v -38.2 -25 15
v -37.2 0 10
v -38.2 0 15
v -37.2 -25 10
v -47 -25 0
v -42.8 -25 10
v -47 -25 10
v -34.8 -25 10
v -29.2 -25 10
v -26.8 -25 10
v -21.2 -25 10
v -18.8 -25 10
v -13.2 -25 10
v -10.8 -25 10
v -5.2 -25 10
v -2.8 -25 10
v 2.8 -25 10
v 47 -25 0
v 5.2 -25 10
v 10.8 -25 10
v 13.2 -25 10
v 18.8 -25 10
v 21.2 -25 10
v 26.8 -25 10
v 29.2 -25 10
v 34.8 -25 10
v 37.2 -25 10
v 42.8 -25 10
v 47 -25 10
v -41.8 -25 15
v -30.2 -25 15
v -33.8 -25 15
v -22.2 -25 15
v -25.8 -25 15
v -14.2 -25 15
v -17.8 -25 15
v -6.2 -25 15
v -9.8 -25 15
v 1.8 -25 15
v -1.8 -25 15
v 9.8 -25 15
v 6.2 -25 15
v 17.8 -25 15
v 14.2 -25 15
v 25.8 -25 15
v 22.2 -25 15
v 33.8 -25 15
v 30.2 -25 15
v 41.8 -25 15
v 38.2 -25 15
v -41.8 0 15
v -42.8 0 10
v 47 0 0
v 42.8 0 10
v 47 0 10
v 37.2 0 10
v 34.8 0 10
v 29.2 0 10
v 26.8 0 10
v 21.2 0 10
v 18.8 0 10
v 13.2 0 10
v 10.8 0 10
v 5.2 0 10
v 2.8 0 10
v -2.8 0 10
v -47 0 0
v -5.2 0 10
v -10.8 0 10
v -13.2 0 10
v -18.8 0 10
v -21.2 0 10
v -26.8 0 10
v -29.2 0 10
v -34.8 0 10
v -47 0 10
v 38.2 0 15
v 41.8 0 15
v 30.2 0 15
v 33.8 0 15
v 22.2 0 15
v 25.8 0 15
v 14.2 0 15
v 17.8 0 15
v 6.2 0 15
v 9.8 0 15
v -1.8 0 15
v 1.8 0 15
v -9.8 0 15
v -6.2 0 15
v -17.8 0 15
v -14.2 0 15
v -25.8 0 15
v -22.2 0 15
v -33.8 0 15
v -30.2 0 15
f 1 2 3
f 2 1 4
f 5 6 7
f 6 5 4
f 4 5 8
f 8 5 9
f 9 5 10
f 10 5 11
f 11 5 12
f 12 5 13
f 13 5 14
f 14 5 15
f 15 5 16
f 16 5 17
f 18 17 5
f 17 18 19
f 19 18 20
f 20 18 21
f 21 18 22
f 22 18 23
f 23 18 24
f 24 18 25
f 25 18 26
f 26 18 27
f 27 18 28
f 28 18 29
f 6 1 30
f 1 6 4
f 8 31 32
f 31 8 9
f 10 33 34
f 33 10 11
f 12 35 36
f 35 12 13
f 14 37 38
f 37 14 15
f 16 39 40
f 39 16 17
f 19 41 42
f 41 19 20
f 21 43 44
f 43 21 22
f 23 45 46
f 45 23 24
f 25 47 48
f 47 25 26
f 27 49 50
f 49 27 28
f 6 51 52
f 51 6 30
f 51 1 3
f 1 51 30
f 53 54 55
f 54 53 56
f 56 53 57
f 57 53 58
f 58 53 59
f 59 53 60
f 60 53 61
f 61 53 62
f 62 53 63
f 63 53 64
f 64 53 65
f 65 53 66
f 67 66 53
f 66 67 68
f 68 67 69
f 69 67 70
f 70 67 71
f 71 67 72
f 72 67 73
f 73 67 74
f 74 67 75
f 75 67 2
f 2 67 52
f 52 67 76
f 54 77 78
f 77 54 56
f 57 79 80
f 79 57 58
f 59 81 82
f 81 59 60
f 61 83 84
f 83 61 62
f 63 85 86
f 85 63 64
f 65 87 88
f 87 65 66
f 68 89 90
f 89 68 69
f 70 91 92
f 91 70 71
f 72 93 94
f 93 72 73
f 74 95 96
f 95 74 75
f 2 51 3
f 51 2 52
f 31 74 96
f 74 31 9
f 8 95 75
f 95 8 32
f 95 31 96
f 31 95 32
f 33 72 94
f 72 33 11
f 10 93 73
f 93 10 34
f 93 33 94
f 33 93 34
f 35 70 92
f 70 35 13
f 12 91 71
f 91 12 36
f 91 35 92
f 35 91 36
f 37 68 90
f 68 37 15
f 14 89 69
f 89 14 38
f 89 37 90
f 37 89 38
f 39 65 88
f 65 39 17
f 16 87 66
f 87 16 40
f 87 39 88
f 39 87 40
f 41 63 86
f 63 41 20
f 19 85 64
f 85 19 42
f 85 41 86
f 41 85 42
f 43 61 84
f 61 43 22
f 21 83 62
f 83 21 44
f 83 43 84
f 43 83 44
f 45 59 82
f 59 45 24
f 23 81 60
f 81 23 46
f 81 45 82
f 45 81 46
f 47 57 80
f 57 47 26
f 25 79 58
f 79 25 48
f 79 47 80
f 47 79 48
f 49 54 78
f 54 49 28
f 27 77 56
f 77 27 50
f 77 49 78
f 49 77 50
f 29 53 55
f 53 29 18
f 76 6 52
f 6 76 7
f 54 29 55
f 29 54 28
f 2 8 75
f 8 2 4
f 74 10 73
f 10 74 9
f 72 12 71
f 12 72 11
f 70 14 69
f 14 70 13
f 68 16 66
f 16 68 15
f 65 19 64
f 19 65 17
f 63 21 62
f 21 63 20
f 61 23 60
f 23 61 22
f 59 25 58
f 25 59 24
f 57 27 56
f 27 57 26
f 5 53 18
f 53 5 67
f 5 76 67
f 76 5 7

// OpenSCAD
$fn = 32;

// ----------------------------------------------------------------------
// Toothed rack, 11 teeth
// 8 mm pitch, 5 mm teeth
// ----------------------------------------------------------------------

// --- parameters (mm) ---
bar_w = 25;     // bar width (Y)
bar_h = 10;     // bar height (Z)
teeth = 11;     // number of teeth
pitch = 8;      // tooth pitch
tooth_h = 5;    // tooth height above the bar
root_w = 6;     // tooth width at the root
crest_w = 3.6;  // tooth width at the crest

// --- derived feature positions (mm) ---
span = (teeth - 1) * pitch;  // = 80   distance between the outer teeth
bar_l = span + root_w + 8;   // = 94   bar length: teeth plus 4 mm at each end
tooth_x = -span / 2;         // = -40   X of the first tooth
height = bar_h + tooth_h;    // = 15   overall height
feature_centers = [
  [tooth_x + 0 * pitch, -bar_w / 2],
  [tooth_x + 1 * pitch, -bar_w / 2],
  [tooth_x + 2 * pitch, -bar_w / 2],
  [tooth_x + 3 * pitch, -bar_w / 2],
  [tooth_x + 4 * pitch, -bar_w / 2],
  [tooth_x + 5 * pitch, -bar_w / 2],
  [tooth_x + 6 * pitch, -bar_w / 2],
  [tooth_x + 7 * pitch, -bar_w / 2],
  [tooth_x + 8 * pitch, -bar_w / 2],
  [tooth_x + 9 * pitch, -bar_w / 2],
  [tooth_x + 10 * pitch, -bar_w / 2]
];   // tooth centre line, drives the tooth loop

// bar with a rack of teeth, one extruded trapezoium per centre
module rack_tooth() {
  linear_extrude(height = bar_w)
    polygon(points = [
      [0, 0],
      [root_w, 0],
      [root_w / 2 + crest_w / 2, tooth_h + 1],
      [root_w / 2 - crest_w / 2, tooth_h + 1]
    ]);
}

union() {
  translate([-bar_l / 2, -bar_w, 0]) cube([bar_l, bar_w, bar_h]);
  for (centre = feature_centers)
    translate([centre[0] - root_w / 2, 0, bar_h - 1]) rotate([90, 0, 0]) rack_tooth();
}
